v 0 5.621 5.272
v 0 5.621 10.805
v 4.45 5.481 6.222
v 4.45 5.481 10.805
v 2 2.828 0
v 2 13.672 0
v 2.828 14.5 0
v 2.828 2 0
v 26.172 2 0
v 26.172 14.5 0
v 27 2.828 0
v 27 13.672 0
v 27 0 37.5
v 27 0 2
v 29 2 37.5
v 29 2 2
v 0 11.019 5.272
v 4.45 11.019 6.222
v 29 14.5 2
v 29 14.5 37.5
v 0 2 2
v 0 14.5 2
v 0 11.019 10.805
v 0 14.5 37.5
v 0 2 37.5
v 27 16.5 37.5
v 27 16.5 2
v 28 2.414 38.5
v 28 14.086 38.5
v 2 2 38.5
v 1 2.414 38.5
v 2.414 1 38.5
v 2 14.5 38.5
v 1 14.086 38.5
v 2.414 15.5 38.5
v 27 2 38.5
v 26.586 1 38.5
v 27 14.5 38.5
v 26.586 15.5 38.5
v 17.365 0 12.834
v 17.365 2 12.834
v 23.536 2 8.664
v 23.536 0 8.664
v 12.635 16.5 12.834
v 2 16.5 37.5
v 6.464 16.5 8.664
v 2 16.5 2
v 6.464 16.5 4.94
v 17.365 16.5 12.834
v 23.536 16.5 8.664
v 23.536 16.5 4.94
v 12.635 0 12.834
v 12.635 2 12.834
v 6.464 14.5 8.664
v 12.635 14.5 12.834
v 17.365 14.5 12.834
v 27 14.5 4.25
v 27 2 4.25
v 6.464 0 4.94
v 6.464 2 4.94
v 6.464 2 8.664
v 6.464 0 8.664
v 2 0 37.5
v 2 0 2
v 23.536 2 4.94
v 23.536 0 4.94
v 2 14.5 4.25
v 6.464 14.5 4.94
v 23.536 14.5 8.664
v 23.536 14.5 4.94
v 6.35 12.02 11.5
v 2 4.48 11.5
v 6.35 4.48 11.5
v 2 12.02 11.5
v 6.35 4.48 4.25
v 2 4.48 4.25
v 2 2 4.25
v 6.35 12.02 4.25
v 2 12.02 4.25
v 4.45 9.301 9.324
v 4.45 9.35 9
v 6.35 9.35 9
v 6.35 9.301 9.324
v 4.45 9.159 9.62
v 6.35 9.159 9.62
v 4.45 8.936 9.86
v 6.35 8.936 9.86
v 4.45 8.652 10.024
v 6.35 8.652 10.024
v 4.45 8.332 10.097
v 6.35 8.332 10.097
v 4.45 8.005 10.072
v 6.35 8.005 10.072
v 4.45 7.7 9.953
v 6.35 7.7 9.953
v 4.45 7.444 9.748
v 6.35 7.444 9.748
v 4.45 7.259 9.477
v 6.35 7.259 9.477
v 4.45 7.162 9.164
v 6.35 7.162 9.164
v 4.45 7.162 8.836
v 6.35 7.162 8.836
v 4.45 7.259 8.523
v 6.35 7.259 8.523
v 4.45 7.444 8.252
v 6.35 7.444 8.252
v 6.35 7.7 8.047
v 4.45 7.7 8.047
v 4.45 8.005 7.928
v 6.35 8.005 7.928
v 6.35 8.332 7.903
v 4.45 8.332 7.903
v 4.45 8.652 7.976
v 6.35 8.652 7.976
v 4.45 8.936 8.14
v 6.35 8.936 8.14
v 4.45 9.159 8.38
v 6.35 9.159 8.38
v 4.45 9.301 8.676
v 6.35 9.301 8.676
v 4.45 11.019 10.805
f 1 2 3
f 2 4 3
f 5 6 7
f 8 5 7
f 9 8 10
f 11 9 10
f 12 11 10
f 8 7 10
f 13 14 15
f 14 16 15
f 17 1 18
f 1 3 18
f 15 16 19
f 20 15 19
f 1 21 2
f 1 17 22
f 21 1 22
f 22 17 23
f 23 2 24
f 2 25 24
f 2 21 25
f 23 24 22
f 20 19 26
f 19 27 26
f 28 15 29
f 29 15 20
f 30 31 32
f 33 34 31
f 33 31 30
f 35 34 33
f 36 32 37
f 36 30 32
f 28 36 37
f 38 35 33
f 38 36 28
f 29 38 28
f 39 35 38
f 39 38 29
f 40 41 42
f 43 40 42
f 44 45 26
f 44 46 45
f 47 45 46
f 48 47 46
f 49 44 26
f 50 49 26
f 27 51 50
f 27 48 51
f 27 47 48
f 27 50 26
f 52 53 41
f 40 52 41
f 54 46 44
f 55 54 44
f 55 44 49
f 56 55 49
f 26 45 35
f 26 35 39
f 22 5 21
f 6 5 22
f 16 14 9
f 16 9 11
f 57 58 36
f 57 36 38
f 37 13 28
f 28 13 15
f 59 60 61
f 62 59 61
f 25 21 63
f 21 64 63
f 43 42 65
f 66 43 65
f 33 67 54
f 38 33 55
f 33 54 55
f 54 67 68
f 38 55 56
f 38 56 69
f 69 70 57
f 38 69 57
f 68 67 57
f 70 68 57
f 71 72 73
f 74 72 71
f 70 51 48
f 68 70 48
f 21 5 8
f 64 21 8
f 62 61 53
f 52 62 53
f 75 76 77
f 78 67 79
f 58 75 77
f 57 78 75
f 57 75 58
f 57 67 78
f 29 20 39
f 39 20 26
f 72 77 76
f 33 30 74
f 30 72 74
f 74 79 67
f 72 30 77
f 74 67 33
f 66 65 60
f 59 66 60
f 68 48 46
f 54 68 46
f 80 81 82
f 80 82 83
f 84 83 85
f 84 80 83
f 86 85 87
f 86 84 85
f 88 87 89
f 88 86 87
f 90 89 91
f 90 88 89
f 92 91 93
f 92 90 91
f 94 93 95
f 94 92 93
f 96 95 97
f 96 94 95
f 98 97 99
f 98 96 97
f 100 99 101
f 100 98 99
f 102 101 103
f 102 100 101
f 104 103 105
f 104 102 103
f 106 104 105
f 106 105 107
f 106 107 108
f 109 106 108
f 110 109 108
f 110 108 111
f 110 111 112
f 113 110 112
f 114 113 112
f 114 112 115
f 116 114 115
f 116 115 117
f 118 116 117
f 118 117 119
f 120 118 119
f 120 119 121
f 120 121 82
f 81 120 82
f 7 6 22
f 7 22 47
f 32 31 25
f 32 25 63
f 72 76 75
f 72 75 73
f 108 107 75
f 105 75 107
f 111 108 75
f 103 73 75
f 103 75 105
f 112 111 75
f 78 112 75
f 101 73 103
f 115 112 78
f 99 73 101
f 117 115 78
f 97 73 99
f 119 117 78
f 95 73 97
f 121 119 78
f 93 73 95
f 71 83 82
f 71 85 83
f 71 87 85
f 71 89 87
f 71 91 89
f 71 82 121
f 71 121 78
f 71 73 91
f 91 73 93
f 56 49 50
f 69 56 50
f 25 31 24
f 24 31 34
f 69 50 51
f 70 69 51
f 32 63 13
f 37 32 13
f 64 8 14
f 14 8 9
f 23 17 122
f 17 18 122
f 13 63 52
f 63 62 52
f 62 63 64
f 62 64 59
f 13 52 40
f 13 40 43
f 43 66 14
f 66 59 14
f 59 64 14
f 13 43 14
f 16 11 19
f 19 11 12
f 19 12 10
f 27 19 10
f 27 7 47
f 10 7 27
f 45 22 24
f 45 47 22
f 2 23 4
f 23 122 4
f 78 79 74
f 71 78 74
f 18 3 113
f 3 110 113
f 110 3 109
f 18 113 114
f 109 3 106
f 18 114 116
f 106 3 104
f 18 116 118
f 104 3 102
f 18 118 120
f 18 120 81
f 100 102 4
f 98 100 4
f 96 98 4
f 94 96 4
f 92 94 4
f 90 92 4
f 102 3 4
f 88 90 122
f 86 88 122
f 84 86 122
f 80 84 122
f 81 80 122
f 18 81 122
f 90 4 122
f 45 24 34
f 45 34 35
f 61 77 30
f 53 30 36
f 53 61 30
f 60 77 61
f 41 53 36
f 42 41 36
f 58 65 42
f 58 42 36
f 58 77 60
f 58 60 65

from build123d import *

# Parameters (mm, degrees)
F0_W      = 29
F0_H      = 16.5
F1_DEPTH  = 38.5
F2_T      = -2
F3_DEPTH  = 2.25
F4_SIZE   = 2
F5_SIZE   = 2
F6_SIZE   = 1
F8_DEPTH  = 16.501
F9_W      = 7.54
F9_H      = 7.25
F9_R      = 1.1
F10_DEPTH = 6.35
F11_W     = 5.398
F11_H     = 5.533
F13_W     = 5.538
F13_H     = 4.583


with BuildPart() as f1:
    # F0 (on Top) → F1 (new body)
    with BuildSketch(Plane.XY):
        with Locations((14.5, 8.25)):
            Rectangle(F0_W, F0_H)
    extrude(amount=F1_DEPTH)

    # F2
    f2_openings = [f1.faces().sort_by_distance(p)[0] for p in [
        (14.5, 8.25, 38.5),
    ]]
    offset(amount=F2_T, openings=f2_openings)

    # F3 (add): a face of the model
    f3_faces = [f1.faces().sort_by_distance(p)[0] for p in [
        (14.5, 8.25, 2),
    ]]
    extrude(f3_faces, amount=F3_DEPTH)

    # F4
    f4_edges = [f1.edges().sort_by_distance(p)[0] for p in [
        (0, 0, 19.25),
        (0, 16.5, 19.25),
        (29, 16.5, 19.25),
        (29, 0, 19.25),
    ]]
    chamfer(f4_edges, length=F4_SIZE)

    # F5
    f5_edges = [f1.edges().sort_by_distance(p)[0] for p in [
        (0, 8.25, 0),
        (1, 15.5, 0),
        (1, 1, 0),
        (14.5, 16.5, 0),
        (14.5, 0, 0),
        (28, 15.5, 0),
        (28, 1, 0),
        (29, 8.25, 0),
    ]]
    chamfer(f5_edges, length=F5_SIZE)

    # F6
    f6_edges = [f1.edges().sort_by_distance(p)[0] for p in [
        (14.5, 0, 38.5),
        (28, 1, 38.5),
        (29, 8.25, 38.5),
        (28, 15.5, 38.5),
        (14.5, 16.5, 38.5),
        (1, 15.5, 38.5),
        (0, 8.25, 38.5),
        (1, 1, 38.5),
    ]]
    chamfer(f6_edges, length=F6_SIZE)

    # F7 (on face) → F8 (cut, through all)
    with BuildSketch(Plane(origin=(0, 16.5, 0), x_dir=(-1, 0, 0), z_dir=(0, 1, 0))):
        Polygon((-23.536, 8.664), (-23.536, 4.94), (-6.464, 4.94), (-6.464, 8.664), (-12.635, 12.834), (-17.365, 12.834), align=None)
    extrude(amount=-F8_DEPTH, mode=Mode.SUBTRACT)

    # F9 (on Right) → F10 (join)
    with BuildSketch(Plane.YZ):
        with Locations((8.25, 7.875)):
            Rectangle(F9_W, F9_H)
        with Locations((8.25, 9)):
            Circle(F9_R, mode=Mode.SUBTRACT)
    extrude(amount=F10_DEPTH)

    # F11 (on Right) → F14 section 0
    with BuildSketch(Plane.YZ):
        with Locations((8.32, 8.0385)):
            Rectangle(F11_W, F11_H)
    # F13 (on offset) → F14 section 1
    with BuildSketch(Plane(origin=(4.45, 0, 0), x_dir=(0, -1, 0), z_dir=(-1, 0, 0))):
        with Locations((-8.25, 8.5135)):
            Rectangle(F13_W, F13_H)
    loft(mode=Mode.SUBTRACT)


solid = f1.part
